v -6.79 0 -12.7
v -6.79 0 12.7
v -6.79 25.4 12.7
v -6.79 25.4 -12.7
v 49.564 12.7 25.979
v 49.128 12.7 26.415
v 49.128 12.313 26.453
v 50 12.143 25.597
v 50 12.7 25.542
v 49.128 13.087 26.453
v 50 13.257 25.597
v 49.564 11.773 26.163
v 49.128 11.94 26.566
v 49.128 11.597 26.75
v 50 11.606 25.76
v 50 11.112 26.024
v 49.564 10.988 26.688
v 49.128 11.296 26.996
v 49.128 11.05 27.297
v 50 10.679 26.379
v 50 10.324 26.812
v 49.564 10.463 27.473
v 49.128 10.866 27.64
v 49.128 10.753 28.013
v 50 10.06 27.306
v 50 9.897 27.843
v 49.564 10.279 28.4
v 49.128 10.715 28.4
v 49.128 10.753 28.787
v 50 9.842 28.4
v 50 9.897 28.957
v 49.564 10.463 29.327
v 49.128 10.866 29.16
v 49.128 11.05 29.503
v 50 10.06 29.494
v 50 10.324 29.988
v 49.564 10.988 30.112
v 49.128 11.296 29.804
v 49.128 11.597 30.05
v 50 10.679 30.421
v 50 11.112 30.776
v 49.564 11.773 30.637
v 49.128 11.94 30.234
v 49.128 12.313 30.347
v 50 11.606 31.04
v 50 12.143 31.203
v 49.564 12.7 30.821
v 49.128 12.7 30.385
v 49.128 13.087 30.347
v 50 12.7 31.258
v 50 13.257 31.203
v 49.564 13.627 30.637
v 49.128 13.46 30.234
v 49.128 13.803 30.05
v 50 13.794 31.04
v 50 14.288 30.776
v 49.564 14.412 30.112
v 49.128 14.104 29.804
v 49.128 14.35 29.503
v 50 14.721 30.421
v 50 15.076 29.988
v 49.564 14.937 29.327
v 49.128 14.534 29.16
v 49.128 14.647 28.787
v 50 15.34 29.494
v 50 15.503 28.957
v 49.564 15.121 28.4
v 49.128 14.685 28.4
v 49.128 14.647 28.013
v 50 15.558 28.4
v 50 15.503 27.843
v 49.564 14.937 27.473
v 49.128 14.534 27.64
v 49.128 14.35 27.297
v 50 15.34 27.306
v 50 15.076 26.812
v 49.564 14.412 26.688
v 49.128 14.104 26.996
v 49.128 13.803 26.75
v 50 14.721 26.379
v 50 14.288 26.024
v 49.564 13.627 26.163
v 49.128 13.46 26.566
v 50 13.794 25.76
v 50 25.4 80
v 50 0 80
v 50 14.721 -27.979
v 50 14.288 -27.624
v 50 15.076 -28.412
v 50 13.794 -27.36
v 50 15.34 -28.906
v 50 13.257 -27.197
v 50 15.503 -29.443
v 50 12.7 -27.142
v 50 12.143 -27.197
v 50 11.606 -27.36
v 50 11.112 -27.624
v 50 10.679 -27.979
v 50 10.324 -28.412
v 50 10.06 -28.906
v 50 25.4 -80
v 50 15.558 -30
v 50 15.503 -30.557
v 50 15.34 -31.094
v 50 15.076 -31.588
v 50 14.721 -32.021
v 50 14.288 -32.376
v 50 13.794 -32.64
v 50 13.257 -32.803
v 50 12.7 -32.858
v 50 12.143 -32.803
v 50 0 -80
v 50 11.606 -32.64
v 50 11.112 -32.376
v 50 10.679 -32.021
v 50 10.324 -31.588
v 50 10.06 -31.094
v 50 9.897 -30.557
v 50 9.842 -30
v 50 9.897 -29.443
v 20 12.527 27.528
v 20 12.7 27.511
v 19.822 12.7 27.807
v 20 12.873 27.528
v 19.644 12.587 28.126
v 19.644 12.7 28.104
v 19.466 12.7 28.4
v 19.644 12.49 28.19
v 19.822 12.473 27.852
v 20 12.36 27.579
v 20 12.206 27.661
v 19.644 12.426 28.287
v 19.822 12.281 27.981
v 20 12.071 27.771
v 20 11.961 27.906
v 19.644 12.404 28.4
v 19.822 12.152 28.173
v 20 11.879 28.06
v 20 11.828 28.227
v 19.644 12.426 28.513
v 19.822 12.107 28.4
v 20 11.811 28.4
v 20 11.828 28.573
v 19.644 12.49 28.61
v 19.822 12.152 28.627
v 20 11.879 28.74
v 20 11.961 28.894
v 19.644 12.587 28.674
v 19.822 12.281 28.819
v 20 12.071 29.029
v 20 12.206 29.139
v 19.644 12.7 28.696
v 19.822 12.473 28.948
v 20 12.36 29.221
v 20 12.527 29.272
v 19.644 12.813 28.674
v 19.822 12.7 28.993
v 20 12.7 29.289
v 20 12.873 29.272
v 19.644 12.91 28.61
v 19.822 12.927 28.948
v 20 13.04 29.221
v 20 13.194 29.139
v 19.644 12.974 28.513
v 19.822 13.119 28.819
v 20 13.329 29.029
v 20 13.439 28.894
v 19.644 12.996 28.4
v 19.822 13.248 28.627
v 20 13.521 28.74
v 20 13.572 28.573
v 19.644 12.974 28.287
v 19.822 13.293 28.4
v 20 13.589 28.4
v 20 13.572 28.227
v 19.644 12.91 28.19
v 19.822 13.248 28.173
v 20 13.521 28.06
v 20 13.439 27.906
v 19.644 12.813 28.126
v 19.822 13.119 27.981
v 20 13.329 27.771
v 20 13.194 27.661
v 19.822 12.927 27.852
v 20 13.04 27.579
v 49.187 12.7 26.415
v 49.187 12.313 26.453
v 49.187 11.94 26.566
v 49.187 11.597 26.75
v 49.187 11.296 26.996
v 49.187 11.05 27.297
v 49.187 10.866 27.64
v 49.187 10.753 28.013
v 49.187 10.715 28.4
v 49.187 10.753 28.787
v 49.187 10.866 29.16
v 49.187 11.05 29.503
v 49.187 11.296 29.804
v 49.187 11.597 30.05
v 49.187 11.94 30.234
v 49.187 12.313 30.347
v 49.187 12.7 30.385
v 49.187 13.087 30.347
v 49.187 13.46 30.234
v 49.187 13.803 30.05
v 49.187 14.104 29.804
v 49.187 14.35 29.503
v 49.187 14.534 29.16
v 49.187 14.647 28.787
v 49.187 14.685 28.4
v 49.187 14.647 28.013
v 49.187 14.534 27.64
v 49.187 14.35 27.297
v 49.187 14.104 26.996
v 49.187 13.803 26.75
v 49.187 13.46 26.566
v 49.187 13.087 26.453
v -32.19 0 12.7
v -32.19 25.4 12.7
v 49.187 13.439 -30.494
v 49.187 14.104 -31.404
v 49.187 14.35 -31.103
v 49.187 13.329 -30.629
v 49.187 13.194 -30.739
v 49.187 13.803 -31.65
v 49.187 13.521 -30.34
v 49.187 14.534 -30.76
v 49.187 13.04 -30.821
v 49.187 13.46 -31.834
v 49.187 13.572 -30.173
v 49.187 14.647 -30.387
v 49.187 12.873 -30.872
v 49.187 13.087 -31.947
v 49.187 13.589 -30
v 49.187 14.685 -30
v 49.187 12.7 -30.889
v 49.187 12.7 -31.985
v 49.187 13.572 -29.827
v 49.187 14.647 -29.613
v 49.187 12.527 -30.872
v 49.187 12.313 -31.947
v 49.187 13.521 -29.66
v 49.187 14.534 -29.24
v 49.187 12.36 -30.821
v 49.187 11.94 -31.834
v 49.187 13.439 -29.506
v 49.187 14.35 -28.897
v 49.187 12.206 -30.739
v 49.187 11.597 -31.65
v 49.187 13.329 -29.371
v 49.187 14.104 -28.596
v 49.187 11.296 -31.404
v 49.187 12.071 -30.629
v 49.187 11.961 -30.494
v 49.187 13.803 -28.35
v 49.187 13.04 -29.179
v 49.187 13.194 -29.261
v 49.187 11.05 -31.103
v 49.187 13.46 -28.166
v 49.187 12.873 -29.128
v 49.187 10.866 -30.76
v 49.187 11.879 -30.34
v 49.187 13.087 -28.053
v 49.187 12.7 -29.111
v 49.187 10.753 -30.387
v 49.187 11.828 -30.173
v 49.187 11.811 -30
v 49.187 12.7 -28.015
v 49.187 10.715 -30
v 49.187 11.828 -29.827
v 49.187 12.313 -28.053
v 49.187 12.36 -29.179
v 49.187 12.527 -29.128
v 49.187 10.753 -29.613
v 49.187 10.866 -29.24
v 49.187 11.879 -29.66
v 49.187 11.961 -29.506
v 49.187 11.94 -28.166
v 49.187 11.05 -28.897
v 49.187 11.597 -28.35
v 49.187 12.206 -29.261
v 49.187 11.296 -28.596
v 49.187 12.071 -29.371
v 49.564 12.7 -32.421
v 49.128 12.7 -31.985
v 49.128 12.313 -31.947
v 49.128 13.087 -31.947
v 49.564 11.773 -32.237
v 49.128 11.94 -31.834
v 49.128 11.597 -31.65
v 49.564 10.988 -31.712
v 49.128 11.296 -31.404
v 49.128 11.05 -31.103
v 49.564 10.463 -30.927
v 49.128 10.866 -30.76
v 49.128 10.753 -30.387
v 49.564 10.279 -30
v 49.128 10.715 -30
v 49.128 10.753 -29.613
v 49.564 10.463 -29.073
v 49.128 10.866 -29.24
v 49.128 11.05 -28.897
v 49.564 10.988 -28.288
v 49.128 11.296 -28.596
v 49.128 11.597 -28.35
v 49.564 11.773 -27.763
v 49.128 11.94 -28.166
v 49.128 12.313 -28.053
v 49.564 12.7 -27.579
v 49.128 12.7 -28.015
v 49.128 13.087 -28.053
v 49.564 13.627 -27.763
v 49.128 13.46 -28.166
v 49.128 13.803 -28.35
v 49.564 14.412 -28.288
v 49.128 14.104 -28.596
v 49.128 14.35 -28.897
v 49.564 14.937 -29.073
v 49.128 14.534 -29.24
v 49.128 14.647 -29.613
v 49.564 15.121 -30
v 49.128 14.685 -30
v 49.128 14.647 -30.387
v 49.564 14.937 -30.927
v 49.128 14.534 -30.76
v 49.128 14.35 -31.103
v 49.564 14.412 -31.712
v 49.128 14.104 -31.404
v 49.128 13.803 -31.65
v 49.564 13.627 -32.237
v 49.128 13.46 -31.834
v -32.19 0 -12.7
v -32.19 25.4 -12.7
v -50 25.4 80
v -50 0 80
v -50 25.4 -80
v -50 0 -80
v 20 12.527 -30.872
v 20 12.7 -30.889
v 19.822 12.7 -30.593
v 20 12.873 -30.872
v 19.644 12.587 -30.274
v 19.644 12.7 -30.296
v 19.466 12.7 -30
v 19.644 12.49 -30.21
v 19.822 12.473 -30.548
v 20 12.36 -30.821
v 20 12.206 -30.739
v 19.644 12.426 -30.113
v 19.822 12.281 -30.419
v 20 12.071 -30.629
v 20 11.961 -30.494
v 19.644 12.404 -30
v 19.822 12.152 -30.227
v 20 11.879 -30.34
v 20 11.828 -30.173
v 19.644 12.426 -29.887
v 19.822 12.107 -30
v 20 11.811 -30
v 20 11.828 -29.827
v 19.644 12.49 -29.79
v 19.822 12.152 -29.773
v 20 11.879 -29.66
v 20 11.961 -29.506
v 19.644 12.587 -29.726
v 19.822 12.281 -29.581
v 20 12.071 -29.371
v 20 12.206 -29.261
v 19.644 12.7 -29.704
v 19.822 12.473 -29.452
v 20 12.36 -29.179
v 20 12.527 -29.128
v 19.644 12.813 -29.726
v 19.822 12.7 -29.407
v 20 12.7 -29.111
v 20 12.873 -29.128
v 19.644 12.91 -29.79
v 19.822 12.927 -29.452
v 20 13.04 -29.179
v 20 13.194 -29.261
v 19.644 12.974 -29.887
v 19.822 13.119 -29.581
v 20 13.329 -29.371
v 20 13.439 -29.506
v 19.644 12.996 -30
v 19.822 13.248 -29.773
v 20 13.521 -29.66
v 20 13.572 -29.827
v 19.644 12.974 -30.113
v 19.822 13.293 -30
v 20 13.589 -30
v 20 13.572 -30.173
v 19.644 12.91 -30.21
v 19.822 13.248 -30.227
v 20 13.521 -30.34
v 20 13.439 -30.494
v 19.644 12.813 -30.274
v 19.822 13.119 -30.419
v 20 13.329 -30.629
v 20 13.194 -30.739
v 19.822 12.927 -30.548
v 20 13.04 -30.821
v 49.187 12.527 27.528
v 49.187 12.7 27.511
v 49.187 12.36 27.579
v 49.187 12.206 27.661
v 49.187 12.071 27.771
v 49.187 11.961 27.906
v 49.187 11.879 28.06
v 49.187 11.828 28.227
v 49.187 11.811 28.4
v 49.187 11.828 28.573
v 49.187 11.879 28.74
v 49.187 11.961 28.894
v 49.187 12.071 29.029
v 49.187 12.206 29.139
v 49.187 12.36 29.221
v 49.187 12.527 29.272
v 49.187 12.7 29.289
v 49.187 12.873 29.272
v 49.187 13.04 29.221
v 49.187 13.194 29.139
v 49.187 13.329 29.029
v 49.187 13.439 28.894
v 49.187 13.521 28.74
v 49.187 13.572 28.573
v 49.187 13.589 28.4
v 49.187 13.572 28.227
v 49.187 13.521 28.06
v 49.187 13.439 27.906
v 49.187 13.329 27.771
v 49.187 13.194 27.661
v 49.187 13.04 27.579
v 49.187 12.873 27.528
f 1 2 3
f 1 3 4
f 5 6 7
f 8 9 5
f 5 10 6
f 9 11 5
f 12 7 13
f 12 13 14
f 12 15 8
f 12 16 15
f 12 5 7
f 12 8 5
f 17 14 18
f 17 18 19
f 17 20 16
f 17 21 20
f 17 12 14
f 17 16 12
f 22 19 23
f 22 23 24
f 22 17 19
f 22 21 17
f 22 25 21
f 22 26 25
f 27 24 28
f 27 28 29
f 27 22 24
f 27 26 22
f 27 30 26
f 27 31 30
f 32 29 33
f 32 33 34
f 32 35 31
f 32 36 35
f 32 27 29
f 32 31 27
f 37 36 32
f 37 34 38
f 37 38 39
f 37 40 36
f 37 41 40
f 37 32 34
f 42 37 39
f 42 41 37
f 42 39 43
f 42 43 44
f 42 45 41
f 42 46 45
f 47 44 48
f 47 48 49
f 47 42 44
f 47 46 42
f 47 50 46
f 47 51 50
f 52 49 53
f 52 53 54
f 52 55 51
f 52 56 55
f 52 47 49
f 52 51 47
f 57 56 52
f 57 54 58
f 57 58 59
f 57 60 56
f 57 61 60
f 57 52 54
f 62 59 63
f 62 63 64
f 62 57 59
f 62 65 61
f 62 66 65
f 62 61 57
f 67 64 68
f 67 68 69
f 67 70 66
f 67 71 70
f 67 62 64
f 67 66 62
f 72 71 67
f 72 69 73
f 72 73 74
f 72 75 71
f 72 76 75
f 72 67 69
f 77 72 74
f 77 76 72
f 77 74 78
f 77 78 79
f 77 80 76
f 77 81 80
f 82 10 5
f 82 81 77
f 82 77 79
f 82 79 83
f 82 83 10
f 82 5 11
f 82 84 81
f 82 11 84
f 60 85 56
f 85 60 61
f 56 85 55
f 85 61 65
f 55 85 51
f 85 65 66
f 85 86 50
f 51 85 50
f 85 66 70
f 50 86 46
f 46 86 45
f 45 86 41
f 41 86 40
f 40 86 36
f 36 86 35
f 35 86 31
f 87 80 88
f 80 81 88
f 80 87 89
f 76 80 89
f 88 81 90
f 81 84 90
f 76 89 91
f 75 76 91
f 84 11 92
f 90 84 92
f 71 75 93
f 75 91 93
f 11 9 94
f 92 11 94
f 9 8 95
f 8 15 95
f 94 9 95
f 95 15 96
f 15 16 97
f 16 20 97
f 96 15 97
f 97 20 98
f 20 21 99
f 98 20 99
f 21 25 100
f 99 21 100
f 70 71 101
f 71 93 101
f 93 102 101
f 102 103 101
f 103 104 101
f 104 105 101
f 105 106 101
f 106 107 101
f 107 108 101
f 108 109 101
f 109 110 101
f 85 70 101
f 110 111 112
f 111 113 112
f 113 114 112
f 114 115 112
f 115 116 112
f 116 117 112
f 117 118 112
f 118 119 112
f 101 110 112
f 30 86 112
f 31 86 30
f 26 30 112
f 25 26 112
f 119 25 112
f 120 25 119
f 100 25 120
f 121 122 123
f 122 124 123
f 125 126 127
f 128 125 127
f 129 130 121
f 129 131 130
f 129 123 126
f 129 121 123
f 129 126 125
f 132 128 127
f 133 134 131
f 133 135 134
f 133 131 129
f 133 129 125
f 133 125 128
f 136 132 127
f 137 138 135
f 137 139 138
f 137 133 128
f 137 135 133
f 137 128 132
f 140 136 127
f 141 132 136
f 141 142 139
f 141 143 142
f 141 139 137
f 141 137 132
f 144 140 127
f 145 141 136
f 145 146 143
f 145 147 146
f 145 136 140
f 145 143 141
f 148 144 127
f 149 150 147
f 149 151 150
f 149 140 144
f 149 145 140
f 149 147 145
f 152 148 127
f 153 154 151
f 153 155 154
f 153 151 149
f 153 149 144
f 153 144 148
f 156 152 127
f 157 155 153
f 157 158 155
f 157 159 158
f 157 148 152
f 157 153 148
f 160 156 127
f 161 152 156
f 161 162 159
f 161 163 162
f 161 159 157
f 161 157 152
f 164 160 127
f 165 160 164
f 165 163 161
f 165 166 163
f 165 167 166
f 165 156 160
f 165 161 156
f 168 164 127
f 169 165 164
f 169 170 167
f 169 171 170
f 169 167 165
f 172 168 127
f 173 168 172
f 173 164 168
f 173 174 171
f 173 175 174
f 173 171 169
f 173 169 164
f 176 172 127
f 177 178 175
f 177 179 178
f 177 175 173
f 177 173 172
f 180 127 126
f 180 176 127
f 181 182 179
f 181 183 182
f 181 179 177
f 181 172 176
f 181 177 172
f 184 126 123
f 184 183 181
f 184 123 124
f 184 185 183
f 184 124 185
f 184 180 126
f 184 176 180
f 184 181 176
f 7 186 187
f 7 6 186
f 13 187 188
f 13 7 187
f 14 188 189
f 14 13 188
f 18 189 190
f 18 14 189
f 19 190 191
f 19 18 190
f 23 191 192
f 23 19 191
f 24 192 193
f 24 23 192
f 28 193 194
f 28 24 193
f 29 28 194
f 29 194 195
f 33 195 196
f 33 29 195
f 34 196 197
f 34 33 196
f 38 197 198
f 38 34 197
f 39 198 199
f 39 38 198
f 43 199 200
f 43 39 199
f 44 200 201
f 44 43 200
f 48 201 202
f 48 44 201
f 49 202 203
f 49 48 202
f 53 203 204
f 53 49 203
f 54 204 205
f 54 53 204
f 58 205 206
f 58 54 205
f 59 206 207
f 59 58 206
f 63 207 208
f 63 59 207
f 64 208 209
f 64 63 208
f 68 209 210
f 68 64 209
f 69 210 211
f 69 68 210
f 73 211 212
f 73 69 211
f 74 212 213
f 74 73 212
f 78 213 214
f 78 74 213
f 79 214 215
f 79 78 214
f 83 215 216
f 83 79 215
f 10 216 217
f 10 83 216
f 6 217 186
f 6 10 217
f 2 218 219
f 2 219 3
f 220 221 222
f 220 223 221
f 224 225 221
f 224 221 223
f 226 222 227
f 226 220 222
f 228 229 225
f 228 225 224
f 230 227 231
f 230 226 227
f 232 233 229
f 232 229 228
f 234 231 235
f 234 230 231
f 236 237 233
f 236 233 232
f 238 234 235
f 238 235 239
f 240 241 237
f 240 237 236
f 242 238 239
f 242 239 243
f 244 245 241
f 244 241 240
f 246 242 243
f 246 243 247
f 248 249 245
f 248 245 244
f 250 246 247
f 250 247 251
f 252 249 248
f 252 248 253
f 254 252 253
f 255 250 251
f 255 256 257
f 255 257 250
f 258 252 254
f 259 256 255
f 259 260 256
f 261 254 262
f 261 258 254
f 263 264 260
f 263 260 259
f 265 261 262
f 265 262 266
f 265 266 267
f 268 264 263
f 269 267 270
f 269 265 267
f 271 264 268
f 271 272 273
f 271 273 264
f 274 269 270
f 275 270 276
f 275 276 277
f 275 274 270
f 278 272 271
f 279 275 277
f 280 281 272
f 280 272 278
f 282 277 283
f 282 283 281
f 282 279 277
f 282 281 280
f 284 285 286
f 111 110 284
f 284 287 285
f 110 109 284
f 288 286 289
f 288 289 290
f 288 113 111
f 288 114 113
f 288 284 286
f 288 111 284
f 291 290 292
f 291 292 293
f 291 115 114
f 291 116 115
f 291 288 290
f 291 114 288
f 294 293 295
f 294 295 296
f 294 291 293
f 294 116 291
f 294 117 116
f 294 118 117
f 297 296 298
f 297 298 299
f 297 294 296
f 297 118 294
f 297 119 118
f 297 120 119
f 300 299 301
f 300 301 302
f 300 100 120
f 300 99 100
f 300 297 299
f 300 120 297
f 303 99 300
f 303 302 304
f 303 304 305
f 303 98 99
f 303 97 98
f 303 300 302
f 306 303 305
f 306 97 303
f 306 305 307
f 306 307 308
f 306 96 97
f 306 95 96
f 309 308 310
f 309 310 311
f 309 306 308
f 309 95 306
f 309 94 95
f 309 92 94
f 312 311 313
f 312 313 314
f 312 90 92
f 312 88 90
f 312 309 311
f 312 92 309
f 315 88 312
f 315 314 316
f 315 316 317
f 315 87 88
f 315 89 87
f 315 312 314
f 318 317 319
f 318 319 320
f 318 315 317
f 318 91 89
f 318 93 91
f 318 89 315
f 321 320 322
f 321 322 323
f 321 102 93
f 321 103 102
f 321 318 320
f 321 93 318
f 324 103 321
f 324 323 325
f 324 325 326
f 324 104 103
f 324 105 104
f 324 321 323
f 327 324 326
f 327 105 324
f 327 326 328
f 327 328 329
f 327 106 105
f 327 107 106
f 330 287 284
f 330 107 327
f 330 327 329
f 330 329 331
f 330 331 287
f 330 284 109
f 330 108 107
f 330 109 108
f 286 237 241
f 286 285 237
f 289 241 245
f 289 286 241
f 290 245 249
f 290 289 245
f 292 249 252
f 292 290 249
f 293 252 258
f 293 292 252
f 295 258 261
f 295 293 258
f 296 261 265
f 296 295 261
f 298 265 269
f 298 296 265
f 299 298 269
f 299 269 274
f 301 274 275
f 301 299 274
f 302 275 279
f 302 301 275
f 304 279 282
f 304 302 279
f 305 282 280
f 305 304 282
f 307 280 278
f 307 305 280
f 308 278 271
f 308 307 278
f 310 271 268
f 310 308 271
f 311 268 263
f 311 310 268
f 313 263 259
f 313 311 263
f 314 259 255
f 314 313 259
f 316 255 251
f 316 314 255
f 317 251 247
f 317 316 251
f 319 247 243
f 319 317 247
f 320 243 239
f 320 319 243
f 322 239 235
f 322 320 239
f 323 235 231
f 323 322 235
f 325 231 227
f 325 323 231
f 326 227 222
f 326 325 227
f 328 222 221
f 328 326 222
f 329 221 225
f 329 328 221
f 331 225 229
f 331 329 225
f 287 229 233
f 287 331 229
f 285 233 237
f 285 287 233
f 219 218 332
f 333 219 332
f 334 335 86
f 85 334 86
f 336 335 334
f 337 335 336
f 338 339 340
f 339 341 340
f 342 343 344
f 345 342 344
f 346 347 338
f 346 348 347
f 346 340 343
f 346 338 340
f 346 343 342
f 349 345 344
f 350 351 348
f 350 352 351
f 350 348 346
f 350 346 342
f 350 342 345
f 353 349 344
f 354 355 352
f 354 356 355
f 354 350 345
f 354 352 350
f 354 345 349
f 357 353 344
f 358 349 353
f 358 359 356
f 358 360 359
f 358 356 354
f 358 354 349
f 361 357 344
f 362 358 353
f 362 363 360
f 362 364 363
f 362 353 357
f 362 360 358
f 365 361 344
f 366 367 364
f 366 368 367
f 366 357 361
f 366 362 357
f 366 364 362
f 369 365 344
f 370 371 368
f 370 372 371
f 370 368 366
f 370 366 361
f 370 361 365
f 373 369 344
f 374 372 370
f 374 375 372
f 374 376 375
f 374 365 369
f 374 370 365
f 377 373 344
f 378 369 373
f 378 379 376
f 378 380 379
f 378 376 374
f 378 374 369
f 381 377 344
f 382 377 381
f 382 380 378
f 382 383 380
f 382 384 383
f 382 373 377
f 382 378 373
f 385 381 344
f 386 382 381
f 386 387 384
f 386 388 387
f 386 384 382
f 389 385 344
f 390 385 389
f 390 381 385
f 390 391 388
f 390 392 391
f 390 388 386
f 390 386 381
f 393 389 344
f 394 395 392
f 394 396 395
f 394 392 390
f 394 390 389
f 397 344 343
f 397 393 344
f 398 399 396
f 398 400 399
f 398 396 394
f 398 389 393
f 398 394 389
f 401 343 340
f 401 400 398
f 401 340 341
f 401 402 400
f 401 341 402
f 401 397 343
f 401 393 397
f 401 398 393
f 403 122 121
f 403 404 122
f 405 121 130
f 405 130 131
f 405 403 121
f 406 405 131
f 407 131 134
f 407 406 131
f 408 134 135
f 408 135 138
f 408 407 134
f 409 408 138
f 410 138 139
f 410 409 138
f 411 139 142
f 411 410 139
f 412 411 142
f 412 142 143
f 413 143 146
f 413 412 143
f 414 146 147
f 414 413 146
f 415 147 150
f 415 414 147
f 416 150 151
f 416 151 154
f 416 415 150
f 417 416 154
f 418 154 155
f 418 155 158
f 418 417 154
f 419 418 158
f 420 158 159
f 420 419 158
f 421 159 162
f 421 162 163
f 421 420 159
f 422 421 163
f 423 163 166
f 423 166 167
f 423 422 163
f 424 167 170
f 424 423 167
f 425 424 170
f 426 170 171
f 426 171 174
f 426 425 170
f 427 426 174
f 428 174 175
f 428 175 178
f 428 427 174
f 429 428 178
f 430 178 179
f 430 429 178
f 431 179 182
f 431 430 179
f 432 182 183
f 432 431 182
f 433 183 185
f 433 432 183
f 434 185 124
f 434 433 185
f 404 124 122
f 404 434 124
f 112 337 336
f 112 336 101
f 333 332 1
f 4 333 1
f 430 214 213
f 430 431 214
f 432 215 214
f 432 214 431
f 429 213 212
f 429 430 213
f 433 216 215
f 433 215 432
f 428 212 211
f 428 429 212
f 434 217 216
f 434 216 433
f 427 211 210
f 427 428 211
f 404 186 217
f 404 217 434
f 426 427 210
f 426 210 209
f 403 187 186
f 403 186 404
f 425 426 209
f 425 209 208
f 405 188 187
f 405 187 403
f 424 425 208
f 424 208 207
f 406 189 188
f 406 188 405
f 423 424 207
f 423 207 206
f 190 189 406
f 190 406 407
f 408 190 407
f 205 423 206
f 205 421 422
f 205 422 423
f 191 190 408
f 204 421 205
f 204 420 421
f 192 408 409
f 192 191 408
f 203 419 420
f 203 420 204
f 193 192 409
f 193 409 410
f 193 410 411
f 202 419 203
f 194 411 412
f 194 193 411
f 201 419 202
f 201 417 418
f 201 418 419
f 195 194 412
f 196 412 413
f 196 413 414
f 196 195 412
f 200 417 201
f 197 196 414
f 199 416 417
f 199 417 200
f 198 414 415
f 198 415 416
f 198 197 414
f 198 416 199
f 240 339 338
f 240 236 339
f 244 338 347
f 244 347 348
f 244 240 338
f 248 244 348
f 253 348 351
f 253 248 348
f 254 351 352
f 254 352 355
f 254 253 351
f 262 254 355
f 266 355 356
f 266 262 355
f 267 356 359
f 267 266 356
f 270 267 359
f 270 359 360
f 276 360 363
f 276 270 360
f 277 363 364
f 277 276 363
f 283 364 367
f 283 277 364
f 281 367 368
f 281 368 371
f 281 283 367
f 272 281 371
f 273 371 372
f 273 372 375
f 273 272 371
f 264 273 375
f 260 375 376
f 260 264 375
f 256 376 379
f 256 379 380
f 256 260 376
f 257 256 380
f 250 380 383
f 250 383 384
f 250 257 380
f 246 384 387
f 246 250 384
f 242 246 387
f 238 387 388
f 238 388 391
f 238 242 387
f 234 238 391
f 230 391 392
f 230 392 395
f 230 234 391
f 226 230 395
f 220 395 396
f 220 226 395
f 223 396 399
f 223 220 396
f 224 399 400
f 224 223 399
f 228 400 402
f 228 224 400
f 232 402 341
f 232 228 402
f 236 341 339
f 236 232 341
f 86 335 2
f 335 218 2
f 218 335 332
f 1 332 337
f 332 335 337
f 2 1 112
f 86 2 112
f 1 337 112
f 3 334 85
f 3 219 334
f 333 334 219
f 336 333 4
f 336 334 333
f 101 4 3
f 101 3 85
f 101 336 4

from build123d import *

# Parameters (mm, degrees)
SKETCH1_W                                   = 100
SKETCH1_H                                   = 160
SKETCH1_W_2                                 = 25.4
SKETCH1_H_2                                 = 25.4
BOSS_EXTRUDE1_DEPTH                         = 25.4
CBORE_FOR_0_BINDING_HEAD_MACHINE_SC_2_COUNT = 2
CBORE_FOR_0_BINDING_HEAD_MACHINE_SC_2_PITCH = 58.4


with BuildPart() as part:
    # Sketch1 → Boss-Extrude1 (new body)
    with BuildSketch(Plane(origin=(0, 0, 0), x_dir=(1, 0, 0), z_dir=(0, 1, 0))):
        Rectangle(SKETCH1_W, SKETCH1_H)
        with Locations((-19.49, 0)):
            Rectangle(SKETCH1_W_2, SKETCH1_H_2, mode=Mode.SUBTRACT)
    extrude(amount=BOSS_EXTRUDE1_DEPTH)

    # Sketch3 → CBORE for #0 Binding Head Machine Screw1 (revolve, cut)
    with BuildSketch(Plane(origin=(50, 12.7, 28.4), x_dir=(0, 0, -1), z_dir=(0, 1, 0))):
        Polygon((0, 0), (0, 30.53416509), (0.889, 30), (0.889, 0.8128), (1.98501, 0.8128), (1.98501, 0.87249), (2.8575, 0), align=None)
    cbore_for_0_binding_head_machine_screw1 = revolve(axis=Axis((56.35, 12.7, 28.4), (-1, 0, 0)), mode=Mode.SUBTRACT)

    # CBORE for _0 Binding Head Machine Sc 2: CBORE for #0 Binding Head Machine Screw1 ×2
    with Locations(*[(0, 0, -i * CBORE_FOR_0_BINDING_HEAD_MACHINE_SC_2_PITCH) for i in range(1, CBORE_FOR_0_BINDING_HEAD_MACHINE_SC_2_COUNT)]):
        add(cbore_for_0_binding_head_machine_screw1, mode=Mode.SUBTRACT)


solid = part.part
